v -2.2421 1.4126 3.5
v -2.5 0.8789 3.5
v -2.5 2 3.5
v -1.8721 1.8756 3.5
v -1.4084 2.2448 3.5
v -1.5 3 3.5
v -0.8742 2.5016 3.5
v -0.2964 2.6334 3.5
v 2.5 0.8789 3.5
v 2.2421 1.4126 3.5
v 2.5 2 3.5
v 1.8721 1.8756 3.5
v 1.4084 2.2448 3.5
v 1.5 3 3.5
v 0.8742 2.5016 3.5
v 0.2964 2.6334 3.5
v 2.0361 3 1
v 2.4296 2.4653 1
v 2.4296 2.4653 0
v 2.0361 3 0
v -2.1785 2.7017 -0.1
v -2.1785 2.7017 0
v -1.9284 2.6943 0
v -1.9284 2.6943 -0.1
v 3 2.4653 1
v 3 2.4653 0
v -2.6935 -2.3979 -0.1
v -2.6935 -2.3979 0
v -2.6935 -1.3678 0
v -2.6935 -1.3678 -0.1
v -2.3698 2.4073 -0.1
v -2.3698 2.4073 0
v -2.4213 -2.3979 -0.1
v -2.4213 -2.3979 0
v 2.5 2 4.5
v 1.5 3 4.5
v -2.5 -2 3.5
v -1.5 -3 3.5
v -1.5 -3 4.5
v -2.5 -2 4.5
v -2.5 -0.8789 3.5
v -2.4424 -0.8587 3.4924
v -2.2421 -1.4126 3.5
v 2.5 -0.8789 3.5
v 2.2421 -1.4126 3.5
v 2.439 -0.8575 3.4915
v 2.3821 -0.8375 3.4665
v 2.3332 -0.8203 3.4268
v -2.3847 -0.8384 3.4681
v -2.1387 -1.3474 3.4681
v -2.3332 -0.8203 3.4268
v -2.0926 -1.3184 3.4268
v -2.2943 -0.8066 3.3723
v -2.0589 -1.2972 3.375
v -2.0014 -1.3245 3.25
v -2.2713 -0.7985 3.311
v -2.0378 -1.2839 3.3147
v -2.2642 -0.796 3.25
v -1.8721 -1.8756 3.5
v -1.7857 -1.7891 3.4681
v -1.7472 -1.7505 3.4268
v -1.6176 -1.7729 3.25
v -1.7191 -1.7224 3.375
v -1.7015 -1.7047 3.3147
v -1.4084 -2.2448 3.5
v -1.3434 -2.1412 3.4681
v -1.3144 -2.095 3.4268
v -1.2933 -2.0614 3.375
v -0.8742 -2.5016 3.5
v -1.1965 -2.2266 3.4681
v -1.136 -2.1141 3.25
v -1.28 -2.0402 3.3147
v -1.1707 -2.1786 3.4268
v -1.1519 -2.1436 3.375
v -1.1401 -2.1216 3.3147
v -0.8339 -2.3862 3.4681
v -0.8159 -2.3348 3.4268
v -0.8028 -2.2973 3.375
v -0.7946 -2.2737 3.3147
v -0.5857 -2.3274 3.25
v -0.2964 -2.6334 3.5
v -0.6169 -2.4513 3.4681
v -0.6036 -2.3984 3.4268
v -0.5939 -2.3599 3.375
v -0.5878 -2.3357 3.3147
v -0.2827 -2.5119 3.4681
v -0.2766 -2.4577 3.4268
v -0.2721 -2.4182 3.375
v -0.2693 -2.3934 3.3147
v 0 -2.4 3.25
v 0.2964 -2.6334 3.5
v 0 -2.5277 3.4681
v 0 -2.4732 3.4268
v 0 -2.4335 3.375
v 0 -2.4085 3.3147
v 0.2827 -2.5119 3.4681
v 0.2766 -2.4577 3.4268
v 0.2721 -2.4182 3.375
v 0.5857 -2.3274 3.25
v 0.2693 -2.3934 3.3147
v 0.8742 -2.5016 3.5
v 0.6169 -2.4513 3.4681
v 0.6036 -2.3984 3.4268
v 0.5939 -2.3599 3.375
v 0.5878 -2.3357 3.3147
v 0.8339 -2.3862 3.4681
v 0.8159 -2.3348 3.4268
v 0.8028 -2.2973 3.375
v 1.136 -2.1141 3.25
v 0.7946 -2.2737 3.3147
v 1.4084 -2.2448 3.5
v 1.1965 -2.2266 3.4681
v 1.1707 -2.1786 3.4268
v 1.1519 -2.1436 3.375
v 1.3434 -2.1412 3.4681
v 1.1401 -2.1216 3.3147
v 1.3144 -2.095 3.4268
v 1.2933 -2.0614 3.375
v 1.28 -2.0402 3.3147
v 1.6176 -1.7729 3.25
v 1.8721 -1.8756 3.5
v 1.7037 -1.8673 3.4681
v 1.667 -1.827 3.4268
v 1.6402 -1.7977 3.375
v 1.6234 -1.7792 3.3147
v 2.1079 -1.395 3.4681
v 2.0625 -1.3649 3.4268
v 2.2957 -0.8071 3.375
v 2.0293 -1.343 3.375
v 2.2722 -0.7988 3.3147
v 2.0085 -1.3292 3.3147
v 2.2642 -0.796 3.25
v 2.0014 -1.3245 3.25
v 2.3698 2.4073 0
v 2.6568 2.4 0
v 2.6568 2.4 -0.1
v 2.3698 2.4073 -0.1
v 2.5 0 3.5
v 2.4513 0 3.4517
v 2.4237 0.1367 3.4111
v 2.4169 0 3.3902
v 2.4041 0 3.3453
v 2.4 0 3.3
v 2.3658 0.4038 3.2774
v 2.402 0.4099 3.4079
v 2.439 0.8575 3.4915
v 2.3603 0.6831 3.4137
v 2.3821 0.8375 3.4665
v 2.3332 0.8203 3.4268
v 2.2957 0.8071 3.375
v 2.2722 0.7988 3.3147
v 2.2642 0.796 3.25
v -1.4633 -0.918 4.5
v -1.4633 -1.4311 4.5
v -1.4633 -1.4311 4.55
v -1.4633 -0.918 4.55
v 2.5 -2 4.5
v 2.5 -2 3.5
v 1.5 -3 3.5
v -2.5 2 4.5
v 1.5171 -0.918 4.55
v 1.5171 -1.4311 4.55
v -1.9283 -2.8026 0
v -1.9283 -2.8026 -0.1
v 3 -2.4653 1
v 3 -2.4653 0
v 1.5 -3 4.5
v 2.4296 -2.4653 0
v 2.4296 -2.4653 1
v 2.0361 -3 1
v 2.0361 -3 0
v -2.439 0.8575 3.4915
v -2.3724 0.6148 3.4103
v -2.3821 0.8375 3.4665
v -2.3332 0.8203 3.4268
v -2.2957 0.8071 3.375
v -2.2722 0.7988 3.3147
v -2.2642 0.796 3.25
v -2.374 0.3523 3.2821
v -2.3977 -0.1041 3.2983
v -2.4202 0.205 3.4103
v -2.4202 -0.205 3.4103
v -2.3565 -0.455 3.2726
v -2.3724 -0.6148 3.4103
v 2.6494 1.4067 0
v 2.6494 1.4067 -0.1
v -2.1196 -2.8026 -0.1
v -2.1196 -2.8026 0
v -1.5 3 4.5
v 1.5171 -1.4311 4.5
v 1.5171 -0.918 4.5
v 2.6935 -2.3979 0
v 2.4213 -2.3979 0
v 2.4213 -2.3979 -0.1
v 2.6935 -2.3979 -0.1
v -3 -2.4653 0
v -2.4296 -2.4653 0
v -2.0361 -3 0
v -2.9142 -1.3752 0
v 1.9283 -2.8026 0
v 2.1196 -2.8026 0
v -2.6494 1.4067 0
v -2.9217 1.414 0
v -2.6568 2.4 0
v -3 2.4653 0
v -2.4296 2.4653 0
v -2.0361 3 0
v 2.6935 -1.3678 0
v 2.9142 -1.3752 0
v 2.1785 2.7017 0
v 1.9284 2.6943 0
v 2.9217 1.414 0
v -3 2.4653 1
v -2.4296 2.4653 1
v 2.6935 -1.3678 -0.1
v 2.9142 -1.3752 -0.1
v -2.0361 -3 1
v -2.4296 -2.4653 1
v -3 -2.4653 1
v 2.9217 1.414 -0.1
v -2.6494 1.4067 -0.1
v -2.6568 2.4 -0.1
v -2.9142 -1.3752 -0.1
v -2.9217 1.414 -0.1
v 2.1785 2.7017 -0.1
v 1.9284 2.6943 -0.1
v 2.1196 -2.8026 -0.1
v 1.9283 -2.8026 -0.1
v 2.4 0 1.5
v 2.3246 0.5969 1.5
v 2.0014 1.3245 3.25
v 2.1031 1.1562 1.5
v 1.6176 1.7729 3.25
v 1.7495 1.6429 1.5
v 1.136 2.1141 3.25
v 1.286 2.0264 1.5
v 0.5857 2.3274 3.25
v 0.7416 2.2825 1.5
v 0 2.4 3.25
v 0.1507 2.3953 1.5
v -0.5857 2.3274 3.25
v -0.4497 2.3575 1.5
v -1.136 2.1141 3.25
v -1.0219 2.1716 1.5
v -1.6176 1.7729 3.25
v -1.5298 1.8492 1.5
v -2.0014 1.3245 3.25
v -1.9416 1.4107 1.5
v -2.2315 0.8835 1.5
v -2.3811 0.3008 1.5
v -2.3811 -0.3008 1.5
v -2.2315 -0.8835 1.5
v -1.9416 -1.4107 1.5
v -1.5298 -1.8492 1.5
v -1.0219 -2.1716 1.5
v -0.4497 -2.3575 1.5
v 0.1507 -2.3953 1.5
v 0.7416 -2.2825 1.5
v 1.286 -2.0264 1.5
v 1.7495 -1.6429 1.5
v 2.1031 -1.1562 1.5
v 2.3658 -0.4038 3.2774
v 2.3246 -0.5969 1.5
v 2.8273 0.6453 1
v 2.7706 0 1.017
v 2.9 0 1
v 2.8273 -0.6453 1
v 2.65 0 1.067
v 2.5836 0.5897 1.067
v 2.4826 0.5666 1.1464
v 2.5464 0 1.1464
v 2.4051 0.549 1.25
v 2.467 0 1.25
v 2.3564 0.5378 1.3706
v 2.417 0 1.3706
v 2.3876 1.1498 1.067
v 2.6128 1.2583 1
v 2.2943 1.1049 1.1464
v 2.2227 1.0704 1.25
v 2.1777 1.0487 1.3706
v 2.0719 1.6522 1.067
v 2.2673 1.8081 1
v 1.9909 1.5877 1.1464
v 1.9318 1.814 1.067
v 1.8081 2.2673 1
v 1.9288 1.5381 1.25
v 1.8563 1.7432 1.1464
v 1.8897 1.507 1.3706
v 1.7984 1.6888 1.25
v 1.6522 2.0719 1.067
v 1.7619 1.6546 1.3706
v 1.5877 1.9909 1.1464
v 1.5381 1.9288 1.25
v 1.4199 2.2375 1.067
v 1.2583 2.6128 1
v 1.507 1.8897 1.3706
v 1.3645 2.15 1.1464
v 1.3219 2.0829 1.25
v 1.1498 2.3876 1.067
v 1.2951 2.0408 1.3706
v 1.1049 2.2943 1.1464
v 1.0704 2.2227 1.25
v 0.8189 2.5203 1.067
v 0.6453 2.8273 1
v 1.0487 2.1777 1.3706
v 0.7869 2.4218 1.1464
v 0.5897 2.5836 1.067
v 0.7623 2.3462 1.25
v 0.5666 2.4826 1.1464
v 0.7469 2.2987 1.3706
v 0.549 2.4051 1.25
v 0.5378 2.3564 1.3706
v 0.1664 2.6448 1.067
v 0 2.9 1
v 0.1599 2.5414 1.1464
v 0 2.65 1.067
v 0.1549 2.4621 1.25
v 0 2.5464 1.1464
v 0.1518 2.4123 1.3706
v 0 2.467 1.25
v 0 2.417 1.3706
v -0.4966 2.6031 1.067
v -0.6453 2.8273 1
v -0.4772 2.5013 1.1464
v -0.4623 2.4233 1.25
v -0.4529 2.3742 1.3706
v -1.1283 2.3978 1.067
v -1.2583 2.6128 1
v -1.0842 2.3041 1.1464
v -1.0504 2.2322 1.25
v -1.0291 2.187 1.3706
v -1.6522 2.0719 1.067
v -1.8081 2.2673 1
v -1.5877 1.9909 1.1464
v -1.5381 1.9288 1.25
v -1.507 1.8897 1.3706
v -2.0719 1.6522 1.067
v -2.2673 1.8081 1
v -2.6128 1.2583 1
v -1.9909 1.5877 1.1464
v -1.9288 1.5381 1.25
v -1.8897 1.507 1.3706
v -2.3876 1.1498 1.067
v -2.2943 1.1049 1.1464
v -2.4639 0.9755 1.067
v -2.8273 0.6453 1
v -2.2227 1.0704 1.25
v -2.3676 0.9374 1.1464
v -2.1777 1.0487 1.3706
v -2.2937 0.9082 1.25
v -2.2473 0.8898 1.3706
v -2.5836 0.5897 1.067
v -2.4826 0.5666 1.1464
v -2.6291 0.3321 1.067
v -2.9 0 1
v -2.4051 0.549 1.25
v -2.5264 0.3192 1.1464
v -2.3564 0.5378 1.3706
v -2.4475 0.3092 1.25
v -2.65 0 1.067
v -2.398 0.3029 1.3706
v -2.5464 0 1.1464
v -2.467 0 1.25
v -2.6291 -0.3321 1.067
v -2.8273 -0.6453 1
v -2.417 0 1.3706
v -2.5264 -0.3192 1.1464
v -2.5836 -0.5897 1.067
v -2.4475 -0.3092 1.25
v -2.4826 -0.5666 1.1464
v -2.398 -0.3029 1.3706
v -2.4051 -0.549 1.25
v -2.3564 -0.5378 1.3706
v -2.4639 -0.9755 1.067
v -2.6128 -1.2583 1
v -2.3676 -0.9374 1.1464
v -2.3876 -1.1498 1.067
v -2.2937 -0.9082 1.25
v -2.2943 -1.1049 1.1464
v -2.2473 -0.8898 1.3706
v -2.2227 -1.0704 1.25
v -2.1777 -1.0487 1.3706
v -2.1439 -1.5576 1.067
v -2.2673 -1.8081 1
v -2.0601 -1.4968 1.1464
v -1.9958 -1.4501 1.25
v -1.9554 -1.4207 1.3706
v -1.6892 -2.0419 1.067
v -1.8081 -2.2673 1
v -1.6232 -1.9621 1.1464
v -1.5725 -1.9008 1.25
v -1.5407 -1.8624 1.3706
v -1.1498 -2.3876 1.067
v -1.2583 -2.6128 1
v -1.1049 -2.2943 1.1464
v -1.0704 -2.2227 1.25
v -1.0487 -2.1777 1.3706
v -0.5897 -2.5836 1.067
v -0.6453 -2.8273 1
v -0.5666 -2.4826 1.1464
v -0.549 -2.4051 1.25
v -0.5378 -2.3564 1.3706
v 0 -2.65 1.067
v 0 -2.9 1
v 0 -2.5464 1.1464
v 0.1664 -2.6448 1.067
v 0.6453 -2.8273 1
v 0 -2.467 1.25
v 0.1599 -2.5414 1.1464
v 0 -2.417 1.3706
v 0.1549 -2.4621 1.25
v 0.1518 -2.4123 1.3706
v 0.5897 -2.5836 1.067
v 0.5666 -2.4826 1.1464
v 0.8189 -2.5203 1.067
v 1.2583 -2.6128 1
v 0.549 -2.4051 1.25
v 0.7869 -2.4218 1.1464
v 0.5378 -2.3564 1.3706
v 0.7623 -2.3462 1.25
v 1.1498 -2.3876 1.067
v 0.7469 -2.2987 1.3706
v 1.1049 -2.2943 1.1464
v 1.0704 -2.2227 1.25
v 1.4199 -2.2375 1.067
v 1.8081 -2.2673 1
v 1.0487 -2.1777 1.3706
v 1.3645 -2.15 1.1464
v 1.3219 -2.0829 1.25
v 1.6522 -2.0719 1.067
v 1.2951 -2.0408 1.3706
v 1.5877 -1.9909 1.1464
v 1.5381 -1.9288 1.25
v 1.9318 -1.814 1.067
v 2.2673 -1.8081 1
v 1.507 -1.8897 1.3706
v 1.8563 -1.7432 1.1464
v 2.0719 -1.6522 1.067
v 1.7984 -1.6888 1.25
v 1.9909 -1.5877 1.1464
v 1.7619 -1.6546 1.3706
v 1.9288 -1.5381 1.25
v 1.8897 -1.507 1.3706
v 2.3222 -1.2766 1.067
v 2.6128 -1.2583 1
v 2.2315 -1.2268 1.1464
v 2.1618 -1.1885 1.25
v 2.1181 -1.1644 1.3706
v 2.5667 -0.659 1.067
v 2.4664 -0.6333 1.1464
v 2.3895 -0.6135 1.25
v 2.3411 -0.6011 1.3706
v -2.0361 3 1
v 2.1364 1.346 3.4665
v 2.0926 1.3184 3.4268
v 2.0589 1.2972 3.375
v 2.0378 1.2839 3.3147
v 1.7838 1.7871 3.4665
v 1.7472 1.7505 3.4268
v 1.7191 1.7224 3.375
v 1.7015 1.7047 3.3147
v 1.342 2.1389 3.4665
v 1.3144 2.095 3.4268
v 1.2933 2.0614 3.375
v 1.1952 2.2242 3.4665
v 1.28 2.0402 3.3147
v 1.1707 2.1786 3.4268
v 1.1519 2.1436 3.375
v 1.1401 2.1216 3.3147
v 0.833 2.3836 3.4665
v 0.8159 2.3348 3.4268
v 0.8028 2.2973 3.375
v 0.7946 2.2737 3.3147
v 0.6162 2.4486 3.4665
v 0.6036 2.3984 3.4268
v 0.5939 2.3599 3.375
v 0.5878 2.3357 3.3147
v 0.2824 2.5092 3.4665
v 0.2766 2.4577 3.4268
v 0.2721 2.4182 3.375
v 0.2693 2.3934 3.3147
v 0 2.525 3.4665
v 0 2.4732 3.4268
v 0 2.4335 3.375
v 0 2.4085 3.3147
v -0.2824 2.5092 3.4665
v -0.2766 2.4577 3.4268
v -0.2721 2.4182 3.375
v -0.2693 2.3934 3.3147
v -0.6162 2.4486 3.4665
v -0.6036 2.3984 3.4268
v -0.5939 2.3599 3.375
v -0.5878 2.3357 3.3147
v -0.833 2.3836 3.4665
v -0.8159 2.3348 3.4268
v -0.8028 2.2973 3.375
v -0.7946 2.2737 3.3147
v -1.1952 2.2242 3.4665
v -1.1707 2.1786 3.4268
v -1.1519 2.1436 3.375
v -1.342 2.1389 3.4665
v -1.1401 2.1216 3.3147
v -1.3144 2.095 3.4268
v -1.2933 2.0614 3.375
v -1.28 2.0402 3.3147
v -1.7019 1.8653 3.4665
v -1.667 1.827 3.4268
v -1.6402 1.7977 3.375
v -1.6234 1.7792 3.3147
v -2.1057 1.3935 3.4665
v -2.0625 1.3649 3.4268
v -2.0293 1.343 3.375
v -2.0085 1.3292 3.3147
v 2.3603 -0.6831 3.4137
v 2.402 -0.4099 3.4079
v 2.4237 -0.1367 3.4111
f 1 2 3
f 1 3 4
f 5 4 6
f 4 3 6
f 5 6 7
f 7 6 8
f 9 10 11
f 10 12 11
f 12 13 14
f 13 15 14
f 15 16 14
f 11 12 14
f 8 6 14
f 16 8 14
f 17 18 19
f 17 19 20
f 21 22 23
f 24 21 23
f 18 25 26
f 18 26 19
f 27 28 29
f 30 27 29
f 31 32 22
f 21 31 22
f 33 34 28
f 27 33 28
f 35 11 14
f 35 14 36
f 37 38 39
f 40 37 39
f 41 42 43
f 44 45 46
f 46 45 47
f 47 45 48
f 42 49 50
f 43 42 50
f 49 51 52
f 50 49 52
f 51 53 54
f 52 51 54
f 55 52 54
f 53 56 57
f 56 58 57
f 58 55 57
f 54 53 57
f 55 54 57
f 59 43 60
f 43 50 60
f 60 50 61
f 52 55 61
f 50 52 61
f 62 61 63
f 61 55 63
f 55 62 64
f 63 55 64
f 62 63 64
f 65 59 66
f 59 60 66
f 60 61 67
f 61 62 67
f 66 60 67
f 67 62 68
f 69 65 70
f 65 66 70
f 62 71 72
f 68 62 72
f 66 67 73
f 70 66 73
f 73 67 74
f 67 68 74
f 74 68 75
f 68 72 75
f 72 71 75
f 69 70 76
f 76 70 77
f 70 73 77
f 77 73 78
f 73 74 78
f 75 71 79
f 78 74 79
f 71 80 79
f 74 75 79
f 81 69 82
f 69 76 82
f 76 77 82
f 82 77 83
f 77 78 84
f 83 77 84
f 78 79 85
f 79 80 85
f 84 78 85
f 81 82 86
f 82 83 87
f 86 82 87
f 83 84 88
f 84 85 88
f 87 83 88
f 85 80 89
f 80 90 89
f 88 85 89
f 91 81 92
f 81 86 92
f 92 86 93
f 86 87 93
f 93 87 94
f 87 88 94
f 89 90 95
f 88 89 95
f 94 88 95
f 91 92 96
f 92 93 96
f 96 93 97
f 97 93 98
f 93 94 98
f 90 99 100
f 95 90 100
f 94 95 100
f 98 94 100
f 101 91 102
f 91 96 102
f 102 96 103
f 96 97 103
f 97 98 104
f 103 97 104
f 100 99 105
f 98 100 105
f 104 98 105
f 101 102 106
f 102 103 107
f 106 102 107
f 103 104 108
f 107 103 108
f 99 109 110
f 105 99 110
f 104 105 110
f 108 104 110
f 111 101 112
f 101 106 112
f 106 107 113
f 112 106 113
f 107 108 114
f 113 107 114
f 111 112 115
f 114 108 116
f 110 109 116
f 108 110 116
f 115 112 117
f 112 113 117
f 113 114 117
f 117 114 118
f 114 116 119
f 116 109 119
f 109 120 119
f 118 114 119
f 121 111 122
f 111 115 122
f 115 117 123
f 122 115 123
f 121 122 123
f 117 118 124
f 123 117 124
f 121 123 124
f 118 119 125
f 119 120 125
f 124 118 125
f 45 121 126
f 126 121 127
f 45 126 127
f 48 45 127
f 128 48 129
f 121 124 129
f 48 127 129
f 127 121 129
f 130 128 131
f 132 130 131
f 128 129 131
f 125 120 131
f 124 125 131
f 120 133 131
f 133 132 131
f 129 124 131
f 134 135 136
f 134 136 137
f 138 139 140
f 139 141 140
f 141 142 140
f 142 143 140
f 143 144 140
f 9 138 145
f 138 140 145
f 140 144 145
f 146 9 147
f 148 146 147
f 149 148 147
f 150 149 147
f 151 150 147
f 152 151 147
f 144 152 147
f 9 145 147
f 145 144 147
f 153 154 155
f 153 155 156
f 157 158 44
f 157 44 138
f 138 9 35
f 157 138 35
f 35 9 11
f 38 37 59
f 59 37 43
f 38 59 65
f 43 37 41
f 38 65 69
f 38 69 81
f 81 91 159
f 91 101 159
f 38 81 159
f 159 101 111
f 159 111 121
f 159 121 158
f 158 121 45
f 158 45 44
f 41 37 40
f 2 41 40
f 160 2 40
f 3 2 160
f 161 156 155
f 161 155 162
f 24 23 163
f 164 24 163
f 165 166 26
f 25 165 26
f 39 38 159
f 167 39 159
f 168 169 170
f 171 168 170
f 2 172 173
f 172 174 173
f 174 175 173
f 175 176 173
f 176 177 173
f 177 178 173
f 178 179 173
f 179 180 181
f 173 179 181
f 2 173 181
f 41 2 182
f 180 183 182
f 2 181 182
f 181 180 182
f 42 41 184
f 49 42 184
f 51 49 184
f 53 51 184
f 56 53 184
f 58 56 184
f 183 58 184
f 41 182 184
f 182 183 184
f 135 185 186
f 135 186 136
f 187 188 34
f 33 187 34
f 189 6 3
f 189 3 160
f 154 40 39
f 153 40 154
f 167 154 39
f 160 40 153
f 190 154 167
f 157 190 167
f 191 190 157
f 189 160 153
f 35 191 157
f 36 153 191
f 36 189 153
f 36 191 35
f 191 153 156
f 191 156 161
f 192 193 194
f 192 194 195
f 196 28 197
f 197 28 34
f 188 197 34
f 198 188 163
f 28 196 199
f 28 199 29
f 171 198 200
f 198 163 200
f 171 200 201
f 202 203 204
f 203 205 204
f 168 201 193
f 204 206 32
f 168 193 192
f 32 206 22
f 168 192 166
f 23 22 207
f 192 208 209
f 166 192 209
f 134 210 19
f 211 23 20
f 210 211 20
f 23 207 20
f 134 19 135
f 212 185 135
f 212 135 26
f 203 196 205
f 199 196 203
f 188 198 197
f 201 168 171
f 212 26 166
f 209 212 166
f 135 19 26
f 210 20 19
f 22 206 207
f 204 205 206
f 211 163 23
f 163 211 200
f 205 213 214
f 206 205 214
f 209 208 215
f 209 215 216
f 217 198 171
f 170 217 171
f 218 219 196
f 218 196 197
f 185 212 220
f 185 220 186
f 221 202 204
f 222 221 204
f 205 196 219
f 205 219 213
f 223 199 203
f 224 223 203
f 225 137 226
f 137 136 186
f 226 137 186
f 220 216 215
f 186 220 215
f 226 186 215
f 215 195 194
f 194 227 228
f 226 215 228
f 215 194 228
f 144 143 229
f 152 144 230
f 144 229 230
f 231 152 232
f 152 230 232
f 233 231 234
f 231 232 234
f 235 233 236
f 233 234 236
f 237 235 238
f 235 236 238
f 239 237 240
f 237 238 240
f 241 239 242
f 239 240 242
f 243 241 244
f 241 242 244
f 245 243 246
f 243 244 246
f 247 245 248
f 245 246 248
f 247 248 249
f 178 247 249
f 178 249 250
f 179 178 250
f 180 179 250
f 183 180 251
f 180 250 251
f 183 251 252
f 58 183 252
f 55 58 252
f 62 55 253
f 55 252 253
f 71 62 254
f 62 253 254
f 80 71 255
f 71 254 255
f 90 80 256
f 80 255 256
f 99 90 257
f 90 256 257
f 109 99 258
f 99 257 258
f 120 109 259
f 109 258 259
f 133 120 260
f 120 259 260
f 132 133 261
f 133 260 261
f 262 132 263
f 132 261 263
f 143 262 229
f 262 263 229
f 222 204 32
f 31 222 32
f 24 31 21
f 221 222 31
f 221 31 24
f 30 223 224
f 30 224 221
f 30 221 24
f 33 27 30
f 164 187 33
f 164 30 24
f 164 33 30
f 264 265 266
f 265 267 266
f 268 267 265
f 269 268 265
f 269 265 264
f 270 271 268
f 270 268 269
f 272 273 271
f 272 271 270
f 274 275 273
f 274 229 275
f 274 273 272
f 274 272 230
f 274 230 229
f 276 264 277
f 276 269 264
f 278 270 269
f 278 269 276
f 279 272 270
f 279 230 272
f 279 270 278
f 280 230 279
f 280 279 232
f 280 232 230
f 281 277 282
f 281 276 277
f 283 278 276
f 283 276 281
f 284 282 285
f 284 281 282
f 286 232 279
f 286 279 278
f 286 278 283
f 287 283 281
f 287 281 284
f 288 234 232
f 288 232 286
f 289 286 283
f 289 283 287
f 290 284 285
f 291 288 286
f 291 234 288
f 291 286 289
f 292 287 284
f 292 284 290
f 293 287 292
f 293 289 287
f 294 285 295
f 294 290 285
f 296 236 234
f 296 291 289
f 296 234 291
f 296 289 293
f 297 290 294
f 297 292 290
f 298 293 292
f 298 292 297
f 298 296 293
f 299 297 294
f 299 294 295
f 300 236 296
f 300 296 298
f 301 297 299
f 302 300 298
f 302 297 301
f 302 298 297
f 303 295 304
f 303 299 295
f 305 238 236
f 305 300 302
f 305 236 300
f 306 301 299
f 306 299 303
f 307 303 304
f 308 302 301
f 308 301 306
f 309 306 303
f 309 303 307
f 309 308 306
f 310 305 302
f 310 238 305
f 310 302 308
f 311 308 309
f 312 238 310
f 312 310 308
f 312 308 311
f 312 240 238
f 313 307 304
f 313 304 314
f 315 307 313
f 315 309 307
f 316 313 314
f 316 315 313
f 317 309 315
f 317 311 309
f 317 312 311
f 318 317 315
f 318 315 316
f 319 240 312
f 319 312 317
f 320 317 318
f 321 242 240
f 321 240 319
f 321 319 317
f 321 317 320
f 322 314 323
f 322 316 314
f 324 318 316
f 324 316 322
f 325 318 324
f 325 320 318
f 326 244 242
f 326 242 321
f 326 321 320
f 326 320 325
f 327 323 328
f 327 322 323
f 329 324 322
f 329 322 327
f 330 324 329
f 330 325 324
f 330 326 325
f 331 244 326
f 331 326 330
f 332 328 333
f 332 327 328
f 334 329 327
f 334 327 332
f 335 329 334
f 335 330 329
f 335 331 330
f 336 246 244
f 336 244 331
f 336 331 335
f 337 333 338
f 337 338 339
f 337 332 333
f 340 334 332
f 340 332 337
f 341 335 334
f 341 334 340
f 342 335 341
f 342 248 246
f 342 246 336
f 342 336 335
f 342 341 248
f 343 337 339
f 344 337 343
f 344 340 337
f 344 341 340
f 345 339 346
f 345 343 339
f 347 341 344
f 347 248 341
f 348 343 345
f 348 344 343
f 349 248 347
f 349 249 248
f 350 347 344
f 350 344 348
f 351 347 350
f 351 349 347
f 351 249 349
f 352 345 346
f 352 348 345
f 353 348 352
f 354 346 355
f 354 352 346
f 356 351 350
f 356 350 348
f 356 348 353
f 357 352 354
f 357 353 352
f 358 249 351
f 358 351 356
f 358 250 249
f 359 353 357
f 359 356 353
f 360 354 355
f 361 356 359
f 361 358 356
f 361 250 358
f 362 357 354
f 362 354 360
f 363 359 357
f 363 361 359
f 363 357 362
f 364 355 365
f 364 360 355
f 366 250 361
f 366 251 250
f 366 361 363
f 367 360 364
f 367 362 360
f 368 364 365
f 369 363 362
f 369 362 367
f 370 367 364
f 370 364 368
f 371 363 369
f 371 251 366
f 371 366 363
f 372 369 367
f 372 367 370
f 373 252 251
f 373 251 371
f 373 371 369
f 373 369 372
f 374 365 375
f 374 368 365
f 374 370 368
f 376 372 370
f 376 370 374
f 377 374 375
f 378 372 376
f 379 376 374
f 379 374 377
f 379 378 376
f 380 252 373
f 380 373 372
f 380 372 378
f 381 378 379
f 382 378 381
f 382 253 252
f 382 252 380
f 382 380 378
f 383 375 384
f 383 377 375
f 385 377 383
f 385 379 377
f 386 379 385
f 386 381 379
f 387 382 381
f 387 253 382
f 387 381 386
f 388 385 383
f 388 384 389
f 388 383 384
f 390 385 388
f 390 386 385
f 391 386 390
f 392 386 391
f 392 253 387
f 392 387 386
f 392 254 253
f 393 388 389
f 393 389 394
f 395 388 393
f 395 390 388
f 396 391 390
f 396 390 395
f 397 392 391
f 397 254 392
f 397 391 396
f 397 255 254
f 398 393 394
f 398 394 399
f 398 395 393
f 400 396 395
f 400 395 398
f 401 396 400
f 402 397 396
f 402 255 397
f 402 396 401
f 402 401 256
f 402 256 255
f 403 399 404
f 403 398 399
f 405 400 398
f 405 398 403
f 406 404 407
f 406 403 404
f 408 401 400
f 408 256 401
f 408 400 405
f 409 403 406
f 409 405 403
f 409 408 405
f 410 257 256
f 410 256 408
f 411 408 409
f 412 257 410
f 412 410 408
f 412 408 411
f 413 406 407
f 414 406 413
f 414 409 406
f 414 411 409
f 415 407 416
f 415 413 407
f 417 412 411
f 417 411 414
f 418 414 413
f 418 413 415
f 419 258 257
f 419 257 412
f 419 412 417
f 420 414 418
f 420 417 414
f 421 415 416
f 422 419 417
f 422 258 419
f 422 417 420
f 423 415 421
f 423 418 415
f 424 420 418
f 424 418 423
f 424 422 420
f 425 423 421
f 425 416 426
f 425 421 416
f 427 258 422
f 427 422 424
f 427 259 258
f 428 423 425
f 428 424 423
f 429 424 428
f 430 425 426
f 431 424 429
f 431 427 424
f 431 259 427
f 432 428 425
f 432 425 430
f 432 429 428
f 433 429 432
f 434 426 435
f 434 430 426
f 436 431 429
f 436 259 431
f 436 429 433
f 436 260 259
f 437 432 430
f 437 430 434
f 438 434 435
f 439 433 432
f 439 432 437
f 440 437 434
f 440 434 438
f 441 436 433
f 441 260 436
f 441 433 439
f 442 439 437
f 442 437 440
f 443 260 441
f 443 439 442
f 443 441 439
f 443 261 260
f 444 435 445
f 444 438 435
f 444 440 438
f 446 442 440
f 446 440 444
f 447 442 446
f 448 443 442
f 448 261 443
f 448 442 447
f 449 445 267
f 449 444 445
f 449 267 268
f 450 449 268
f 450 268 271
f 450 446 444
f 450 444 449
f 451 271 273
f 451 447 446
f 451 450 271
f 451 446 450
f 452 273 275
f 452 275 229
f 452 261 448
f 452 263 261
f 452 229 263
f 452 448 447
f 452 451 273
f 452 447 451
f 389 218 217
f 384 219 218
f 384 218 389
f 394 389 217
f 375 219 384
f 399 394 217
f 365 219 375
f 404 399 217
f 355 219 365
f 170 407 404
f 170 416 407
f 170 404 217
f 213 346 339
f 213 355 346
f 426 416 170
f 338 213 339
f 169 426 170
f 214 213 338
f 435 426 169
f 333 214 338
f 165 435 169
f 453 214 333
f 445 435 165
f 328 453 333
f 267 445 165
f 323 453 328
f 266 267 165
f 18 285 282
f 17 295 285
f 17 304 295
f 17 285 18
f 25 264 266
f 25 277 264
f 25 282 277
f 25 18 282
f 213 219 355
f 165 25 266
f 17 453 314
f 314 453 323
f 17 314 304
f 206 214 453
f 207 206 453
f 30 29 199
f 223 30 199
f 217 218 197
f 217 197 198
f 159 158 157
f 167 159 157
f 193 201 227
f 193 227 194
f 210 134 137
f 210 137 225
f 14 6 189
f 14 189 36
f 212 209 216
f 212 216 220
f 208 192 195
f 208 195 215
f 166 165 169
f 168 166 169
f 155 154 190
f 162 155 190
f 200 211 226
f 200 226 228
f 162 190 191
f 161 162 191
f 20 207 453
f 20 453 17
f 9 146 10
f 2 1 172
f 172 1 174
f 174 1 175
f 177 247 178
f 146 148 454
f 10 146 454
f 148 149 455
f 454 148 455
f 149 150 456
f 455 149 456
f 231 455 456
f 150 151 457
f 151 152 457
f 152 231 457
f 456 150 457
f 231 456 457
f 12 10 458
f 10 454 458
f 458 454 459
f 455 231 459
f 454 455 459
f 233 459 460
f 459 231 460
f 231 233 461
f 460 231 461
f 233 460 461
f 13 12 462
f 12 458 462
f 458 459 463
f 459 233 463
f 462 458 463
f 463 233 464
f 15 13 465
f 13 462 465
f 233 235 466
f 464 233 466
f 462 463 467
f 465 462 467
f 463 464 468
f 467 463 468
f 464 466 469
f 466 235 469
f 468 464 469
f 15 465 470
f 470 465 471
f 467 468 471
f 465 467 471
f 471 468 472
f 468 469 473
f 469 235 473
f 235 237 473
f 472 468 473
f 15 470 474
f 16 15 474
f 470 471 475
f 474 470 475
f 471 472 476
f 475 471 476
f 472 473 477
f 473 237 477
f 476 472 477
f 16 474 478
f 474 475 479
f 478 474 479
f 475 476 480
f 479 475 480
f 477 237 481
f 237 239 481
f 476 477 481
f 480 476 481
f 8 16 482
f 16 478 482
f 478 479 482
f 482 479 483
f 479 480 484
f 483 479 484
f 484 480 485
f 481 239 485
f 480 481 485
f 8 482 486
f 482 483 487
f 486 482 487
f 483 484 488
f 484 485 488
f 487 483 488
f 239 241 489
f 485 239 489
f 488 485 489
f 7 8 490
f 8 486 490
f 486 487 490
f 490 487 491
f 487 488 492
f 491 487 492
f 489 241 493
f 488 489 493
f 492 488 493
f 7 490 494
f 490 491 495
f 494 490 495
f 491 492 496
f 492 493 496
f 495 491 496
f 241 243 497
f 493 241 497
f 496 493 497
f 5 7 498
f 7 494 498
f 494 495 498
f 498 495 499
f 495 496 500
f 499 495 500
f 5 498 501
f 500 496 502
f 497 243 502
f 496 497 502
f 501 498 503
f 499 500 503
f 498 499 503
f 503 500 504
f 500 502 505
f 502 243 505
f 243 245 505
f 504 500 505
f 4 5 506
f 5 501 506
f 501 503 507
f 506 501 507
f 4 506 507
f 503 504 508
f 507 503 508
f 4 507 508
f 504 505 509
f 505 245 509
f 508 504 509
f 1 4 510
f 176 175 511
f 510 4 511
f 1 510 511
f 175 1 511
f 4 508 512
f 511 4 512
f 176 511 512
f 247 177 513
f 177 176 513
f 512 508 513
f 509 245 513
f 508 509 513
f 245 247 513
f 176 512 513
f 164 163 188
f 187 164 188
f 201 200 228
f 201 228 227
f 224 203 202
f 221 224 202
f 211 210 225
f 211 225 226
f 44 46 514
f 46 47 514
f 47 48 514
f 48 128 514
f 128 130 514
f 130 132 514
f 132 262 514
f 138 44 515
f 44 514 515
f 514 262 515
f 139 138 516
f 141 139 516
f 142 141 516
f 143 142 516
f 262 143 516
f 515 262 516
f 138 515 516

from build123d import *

# Parameters (mm, degrees)
SKETCH_W     = 6
SKETCH_H     = 6
PAD_DEPTH    = 1
POCKET_DEPTH = 1
SKETCH002_R  = 2.4
PAD001_DEPTH = 2.5
FILLET_R     = 0.5
SKETCH003_W  = 5
SKETCH003_H  = 6
PAD002_DEPTH = 1
CHAMFER_SIZE = 1
FILLET001_R  = 0.25
PAD003_DEPTH = 0.1
SKETCH005_W  = 2.980372
SKETCH005_H  = 0.513015
PAD004_DEPTH = 0.05


with BuildPart() as part:
    # Sketch → Pad (new body)
    with BuildSketch(Plane.XY):
        Rectangle(SKETCH_W, SKETCH_H)
    extrude(amount=PAD_DEPTH)

    # Sketch001 (on Face6 of Pad) → Pocket (cut)
    with BuildSketch(Plane.XY.offset(1)):
        Polygon((-3, 3), (-3, 2.465282), (-2.429642, 2.465282), (-2.036143, 3), align=None)
        Polygon((3, 3), (3, 2.465282), (2.429642, 2.465282), (2.036143, 3), align=None)
        Polygon((-3, -3), (-3, -2.465282), (-2.429642, -2.465282), (-2.036143, -3), align=None)
        Polygon((3, -3), (3, -2.465282), (2.429642, -2.465282), (2.036143, -3), align=None)
    extrude(amount=-POCKET_DEPTH, mode=Mode.SUBTRACT)

    # Sketch002 (on Face4 of Pocket) → Pad001 (join)
    with BuildSketch(Plane.XY.offset(1)):
        Circle(SKETCH002_R)
    extrude(amount=PAD001_DEPTH)

    # Fillet
    fillet_edges = [part.edges().sort_by_distance(p)[0] for p in [
        (-2.4, 0, 1),
    ]]
    fillet(fillet_edges, radius=FILLET_R)

    # Sketch003 (on Face17 of Fillet) → Pad002 (join)
    with BuildSketch(Plane.XY.offset(3.5)):
        Rectangle(SKETCH003_W, SKETCH003_H)
    extrude(amount=PAD002_DEPTH)

    # Chamfer
    chamfer_edges = [part.edges().sort_by_distance(p)[0] for p in [
        (-2.5, -3, 4),
        (2.5, -3, 4),
        (-2.5, 3, 4),
        (2.5, 3, 4),
    ]]
    chamfer(chamfer_edges, length=CHAMFER_SIZE)

    # Fillet001
    fillet001_edges = [part.edges().sort_by_distance(p)[0] for p in [
        (-2.4, 0, 3.5),
    ]]
    fillet(fillet001_edges, radius=FILLET001_R)

    # Sketch004 (on Face32 of Fillet001) → Pad003 (join)
    with BuildSketch(Plane(origin=(0, 0, 0), x_dir=(1, 0, 0), z_dir=(0, 0, -1))):
        Polygon((-2.914238, 1.375165), (-2.921686, -1.414024), (-2.649441, -1.406666), (-2.656799, -2.39999), (-2.369838, -2.407348), (-2.178532, -2.701667), (-1.928361, -2.694309), (-1.928272, 2.80261), (-2.119579, 2.80261), (-2.421255, 2.397922), (-2.6935, 2.397922), (-2.6935, 1.367807), align=None)
    pad003 = extrude(amount=PAD003_DEPTH)

    # Mirrored: Pad003 across YZ
    add(pad003.mirror(Plane.YZ))

    # Sketch005 (on Face10 of Mirrored) → Pad004 (join)
    with BuildSketch(Plane.XY.offset(4.5)):
        with Locations((0.026899, -1.174543)):
            Rectangle(SKETCH005_W, SKETCH005_H)
    extrude(amount=PAD004_DEPTH)


solid = part.part
